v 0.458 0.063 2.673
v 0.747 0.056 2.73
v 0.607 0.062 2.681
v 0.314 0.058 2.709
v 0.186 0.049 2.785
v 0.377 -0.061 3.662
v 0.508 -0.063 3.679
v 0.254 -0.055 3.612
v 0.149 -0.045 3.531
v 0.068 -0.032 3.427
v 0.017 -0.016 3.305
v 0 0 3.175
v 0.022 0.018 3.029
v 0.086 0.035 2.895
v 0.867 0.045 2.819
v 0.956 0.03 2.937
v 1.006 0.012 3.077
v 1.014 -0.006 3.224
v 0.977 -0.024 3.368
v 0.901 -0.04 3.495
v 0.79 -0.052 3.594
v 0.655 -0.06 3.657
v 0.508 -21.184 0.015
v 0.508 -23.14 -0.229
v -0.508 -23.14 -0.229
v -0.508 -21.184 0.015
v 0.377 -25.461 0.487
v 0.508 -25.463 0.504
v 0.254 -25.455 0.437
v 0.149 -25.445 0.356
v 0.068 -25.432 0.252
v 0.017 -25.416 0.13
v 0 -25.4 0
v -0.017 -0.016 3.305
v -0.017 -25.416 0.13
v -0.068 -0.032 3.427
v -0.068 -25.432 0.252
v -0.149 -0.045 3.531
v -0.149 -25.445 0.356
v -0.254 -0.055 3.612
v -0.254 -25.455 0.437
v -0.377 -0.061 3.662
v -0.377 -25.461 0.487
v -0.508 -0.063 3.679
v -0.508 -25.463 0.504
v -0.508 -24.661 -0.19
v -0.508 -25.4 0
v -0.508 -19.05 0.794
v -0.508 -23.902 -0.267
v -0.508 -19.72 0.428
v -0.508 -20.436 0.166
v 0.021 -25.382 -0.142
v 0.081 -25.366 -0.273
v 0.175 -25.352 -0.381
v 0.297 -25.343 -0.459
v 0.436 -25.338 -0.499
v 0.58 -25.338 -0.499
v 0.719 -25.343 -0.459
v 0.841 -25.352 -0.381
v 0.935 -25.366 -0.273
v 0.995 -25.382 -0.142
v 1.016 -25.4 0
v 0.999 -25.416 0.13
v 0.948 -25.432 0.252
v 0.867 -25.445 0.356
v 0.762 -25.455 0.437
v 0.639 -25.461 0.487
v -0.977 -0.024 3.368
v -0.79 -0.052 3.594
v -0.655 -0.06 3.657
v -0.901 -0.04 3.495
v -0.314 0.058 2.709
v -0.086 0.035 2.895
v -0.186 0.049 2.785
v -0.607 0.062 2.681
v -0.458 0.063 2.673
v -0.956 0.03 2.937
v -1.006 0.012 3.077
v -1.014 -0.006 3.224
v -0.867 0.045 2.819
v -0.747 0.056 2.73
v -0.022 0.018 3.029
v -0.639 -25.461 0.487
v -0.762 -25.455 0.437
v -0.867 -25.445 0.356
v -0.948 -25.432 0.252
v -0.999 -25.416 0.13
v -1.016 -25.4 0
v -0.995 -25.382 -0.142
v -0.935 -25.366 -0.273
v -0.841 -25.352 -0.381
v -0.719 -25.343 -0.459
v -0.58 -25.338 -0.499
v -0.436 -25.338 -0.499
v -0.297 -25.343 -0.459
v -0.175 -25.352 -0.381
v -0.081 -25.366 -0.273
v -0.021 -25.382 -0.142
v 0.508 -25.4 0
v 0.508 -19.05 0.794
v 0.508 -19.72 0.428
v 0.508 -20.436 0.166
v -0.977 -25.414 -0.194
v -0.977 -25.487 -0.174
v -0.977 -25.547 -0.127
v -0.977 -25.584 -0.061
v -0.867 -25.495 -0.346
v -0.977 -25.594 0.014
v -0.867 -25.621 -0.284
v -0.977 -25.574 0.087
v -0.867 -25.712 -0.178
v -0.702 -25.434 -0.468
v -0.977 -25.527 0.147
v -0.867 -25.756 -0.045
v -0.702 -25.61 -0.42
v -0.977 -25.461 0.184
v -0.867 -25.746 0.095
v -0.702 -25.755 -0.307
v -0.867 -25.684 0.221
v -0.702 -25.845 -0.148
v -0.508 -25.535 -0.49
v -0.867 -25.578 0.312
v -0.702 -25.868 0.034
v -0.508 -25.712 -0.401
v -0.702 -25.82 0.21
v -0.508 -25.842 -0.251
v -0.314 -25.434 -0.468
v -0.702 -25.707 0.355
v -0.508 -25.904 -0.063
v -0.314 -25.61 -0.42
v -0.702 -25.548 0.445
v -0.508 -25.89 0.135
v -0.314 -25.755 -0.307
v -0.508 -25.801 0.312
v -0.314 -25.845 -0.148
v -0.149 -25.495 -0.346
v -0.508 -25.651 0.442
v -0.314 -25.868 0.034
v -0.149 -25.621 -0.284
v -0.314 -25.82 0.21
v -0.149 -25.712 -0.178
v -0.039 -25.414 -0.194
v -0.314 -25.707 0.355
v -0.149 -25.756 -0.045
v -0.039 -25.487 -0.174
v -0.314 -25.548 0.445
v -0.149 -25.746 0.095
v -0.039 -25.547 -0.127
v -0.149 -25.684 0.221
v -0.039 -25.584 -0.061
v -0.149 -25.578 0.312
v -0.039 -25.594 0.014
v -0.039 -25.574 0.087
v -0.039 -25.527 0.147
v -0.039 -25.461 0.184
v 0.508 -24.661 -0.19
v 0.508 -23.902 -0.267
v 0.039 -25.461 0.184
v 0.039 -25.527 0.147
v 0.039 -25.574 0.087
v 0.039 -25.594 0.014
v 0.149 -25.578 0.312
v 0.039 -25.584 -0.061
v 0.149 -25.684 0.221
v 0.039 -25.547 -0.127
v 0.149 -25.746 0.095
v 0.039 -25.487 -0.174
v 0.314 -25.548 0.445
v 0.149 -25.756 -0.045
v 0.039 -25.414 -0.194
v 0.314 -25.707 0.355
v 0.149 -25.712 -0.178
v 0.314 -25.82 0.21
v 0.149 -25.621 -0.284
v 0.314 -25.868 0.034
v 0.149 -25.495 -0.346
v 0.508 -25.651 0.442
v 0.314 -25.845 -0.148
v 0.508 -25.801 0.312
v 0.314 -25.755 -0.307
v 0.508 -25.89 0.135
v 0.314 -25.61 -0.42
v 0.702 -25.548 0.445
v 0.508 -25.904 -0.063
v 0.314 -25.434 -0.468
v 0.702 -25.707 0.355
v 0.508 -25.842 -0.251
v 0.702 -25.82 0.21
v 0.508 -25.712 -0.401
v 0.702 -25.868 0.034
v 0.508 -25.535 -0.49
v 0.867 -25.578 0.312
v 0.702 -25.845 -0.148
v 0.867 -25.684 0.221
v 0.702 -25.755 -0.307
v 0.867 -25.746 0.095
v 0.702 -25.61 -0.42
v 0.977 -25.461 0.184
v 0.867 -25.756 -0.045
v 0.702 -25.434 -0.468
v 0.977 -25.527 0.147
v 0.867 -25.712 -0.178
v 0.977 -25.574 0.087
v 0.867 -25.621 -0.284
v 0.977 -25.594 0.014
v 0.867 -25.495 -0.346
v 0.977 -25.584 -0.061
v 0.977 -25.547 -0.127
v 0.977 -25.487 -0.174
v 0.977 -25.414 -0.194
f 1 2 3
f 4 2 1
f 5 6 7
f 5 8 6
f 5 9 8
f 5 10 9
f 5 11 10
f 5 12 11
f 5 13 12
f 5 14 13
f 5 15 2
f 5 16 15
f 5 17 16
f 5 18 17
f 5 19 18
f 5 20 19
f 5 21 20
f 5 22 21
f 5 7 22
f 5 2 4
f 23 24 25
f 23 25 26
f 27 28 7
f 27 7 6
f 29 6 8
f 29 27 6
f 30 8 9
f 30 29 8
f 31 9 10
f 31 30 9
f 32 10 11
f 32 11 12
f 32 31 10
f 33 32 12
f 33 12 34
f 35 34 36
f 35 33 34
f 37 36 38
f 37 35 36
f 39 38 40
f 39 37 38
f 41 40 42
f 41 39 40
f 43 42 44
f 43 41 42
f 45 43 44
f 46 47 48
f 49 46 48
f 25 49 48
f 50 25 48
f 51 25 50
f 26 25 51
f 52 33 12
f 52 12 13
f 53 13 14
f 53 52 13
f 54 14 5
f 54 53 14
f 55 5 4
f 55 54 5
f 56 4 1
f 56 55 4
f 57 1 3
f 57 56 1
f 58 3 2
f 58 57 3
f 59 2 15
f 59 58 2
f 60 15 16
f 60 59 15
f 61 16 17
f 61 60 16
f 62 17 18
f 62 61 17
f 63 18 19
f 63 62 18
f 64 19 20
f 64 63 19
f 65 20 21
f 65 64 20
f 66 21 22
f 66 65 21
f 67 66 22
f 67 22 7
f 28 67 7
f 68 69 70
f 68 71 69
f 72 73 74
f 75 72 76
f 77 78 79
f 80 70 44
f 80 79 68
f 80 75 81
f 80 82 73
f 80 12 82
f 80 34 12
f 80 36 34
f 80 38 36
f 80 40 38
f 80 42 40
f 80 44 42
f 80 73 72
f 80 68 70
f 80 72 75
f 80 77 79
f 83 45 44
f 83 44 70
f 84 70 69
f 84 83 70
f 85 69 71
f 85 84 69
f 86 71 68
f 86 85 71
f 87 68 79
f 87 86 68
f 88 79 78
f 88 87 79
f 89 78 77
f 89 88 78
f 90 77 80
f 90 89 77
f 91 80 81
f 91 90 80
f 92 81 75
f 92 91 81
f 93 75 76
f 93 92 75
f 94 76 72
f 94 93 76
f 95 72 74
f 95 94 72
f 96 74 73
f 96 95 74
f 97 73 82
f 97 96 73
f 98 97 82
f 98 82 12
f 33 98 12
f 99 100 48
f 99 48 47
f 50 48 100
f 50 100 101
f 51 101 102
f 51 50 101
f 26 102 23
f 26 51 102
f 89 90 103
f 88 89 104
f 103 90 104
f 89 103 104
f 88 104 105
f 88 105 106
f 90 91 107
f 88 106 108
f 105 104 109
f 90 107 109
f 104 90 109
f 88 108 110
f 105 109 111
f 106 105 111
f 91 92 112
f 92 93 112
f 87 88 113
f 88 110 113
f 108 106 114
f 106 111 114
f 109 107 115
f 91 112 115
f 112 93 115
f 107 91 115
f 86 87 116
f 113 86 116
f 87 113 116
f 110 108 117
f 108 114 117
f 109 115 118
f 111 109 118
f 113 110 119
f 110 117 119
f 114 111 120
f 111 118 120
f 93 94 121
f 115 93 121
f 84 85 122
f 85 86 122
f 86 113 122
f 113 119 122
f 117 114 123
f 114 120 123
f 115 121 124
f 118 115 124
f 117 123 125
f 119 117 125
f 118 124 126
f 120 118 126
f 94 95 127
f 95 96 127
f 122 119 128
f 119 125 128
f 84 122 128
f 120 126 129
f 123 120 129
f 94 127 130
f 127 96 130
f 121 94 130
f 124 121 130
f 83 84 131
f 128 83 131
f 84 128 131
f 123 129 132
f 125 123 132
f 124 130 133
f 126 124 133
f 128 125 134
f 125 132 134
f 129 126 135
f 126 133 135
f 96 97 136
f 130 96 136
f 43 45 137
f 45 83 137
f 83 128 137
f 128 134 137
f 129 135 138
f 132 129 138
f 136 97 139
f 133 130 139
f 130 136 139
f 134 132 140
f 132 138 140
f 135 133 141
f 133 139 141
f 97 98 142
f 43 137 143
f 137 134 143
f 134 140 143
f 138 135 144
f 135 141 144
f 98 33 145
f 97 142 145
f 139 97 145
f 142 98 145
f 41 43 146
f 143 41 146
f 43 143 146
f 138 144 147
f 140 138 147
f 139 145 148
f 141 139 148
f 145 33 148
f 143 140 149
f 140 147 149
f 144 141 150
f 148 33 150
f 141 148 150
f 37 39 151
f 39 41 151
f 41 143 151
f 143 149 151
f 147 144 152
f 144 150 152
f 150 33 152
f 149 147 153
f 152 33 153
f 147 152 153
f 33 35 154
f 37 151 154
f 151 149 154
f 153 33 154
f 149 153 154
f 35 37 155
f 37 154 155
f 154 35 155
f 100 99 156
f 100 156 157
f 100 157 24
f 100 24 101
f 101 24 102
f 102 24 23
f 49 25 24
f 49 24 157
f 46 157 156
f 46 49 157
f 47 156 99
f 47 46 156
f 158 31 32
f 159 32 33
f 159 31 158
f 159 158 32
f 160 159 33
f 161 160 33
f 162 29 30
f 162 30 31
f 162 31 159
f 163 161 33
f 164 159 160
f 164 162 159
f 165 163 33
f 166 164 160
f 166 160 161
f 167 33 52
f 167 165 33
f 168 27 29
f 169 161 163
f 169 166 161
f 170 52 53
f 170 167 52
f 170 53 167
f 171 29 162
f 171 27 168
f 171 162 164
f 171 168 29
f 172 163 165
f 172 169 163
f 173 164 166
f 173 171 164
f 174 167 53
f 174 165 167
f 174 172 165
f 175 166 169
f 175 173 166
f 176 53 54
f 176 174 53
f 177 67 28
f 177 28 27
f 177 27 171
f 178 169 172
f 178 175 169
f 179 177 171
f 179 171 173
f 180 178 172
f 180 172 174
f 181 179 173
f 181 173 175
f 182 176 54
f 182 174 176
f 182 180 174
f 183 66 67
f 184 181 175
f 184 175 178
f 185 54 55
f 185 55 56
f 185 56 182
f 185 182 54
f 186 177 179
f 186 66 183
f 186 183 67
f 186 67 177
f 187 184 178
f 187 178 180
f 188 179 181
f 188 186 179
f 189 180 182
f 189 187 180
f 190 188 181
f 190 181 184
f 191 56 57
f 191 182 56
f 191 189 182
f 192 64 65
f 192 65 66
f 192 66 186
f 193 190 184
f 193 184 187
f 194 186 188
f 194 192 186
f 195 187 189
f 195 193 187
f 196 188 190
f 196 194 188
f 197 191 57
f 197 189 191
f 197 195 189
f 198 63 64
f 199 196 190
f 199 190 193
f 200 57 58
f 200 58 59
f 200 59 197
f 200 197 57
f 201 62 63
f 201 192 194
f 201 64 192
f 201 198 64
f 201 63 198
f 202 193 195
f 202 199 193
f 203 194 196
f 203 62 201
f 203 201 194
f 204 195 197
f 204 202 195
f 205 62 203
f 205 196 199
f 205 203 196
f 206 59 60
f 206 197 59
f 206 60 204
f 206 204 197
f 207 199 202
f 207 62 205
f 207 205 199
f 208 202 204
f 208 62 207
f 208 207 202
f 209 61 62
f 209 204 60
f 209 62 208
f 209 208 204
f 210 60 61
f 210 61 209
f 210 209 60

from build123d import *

# Parameters (mm, degrees)
F14_DEPTH      = 0.508
F14_DEPTH_BACK = 0.508
F15_T1_DEPTH   = 12.0876033166
F16_T1_DEPTH   = 11.7701033166


# Not quite as in the source:
# - a fillet or chamfer that OpenCascade refuses, or shapes differently, is made with other operations: its cross-section is extruded or revolved along the edge and cut away or added


with BuildPart() as f7:
    # F5 (on offset) → F7 (revolve)
    with BuildSketch(Plane.YZ.offset(0.508)):
        Polygon((-25.4, 0), (0, 3.175), (-0.0630096452, 3.6790771614), (-25.4630096452, 0.5040771614), align=None)
    revolve(axis=Axis((0.508, -12.7, 1.5875), (0, -0.9922778767, -0.1240347346)))



with BuildPart() as f8:
    # F6 (on offset) → F8 (revolve)
    with BuildSketch(Plane.YZ.offset(-0.508)):
        Polygon((-25.4, 0), (0, 3.175), (-0.0630096452, 3.6790771614), (-25.4630096452, 0.5040771614), align=None)
    revolve(axis=Axis((-0.508, -12.7, 1.5875), (0, -0.9922778767, -0.1240347346)))

    # F9 (on offset) → F11 (revolve)
    with BuildSketch(Plane.XZ.offset(25.4)):
        with BuildLine():
            ThreePointArc((-1.016, 0), (-0.508, -0.508), (0, 0))
            Line((0, 0), (-1.016, 0))
        make_face()
    revolve(axis=Axis((-0.508, -25.4, 0), (-1, 0, 0)))


with BuildPart() as f7_1:
    add(f7.part)

    add(f8.part)  # F12 merges F8
    # F10 (on offset) → F12 (revolve)
    with BuildSketch(Plane.XZ.offset(25.4)):
        with BuildLine():
            ThreePointArc((0, 0), (0.508, -0.508), (1.016, 0))
            Line((1.016, 0), (0, 0))
        make_face()
    revolve(axis=Axis((0.508, -25.4, 0), (1, 0, 0)))


with BuildPart() as f14:
    # F13 (on Right) → F14 (new body, two sides)
    with BuildSketch(Plane.YZ) as f14_sk:
        Polygon((-19.05, 0.281796633), (-19.05, 0.79375), (-25.4, 0), (-25.3369903548, -0.5040771614), align=None)
    extrude(amount=F14_DEPTH)
    extrude(f14_sk.sketch, amount=-F14_DEPTH_BACK)

    # F15: fillet of radius 5.08 on 1 edges, made by hand

    # F15_s2 → F15_t1 (cut)
    with BuildSketch(Plane.YZ.offset(-6.0438016583)):
        with BuildLine():
            ThreePointArc((-23.1397689487, -0.2294244856), (-24.2828741459, -0.2426831475), (-25.4, 0))
            Line((-25.4, 0), (-25.3369903548, -0.5040771614))
            Line((-25.3369903548, -0.5040771614), (-23.1397689487, -0.2294244856))
        make_face()
    extrude(amount=F15_T1_DEPTH, mode=Mode.SUBTRACT)

    # F16: fillet of radius 5.08 on 1 edges, made by hand

    # F16_s2 → F16_t1 (cut)
    with BuildSketch(Plane.YZ.offset(-5.8850516583)):
        with BuildLine():
            ThreePointArc((-19.05, 0.79375), (-20.0730153607, 0.2835492006), (-21.184211761, 0.0150201629))
            Line((-21.184211761, 0.0150201629), (-19.05, 0.281796633))
            Line((-19.05, 0.281796633), (-19.05, 0.79375))
        make_face()
    extrude(amount=F16_T1_DEPTH, mode=Mode.SUBTRACT)


solid = Compound([f7_1.part, f14.part])
